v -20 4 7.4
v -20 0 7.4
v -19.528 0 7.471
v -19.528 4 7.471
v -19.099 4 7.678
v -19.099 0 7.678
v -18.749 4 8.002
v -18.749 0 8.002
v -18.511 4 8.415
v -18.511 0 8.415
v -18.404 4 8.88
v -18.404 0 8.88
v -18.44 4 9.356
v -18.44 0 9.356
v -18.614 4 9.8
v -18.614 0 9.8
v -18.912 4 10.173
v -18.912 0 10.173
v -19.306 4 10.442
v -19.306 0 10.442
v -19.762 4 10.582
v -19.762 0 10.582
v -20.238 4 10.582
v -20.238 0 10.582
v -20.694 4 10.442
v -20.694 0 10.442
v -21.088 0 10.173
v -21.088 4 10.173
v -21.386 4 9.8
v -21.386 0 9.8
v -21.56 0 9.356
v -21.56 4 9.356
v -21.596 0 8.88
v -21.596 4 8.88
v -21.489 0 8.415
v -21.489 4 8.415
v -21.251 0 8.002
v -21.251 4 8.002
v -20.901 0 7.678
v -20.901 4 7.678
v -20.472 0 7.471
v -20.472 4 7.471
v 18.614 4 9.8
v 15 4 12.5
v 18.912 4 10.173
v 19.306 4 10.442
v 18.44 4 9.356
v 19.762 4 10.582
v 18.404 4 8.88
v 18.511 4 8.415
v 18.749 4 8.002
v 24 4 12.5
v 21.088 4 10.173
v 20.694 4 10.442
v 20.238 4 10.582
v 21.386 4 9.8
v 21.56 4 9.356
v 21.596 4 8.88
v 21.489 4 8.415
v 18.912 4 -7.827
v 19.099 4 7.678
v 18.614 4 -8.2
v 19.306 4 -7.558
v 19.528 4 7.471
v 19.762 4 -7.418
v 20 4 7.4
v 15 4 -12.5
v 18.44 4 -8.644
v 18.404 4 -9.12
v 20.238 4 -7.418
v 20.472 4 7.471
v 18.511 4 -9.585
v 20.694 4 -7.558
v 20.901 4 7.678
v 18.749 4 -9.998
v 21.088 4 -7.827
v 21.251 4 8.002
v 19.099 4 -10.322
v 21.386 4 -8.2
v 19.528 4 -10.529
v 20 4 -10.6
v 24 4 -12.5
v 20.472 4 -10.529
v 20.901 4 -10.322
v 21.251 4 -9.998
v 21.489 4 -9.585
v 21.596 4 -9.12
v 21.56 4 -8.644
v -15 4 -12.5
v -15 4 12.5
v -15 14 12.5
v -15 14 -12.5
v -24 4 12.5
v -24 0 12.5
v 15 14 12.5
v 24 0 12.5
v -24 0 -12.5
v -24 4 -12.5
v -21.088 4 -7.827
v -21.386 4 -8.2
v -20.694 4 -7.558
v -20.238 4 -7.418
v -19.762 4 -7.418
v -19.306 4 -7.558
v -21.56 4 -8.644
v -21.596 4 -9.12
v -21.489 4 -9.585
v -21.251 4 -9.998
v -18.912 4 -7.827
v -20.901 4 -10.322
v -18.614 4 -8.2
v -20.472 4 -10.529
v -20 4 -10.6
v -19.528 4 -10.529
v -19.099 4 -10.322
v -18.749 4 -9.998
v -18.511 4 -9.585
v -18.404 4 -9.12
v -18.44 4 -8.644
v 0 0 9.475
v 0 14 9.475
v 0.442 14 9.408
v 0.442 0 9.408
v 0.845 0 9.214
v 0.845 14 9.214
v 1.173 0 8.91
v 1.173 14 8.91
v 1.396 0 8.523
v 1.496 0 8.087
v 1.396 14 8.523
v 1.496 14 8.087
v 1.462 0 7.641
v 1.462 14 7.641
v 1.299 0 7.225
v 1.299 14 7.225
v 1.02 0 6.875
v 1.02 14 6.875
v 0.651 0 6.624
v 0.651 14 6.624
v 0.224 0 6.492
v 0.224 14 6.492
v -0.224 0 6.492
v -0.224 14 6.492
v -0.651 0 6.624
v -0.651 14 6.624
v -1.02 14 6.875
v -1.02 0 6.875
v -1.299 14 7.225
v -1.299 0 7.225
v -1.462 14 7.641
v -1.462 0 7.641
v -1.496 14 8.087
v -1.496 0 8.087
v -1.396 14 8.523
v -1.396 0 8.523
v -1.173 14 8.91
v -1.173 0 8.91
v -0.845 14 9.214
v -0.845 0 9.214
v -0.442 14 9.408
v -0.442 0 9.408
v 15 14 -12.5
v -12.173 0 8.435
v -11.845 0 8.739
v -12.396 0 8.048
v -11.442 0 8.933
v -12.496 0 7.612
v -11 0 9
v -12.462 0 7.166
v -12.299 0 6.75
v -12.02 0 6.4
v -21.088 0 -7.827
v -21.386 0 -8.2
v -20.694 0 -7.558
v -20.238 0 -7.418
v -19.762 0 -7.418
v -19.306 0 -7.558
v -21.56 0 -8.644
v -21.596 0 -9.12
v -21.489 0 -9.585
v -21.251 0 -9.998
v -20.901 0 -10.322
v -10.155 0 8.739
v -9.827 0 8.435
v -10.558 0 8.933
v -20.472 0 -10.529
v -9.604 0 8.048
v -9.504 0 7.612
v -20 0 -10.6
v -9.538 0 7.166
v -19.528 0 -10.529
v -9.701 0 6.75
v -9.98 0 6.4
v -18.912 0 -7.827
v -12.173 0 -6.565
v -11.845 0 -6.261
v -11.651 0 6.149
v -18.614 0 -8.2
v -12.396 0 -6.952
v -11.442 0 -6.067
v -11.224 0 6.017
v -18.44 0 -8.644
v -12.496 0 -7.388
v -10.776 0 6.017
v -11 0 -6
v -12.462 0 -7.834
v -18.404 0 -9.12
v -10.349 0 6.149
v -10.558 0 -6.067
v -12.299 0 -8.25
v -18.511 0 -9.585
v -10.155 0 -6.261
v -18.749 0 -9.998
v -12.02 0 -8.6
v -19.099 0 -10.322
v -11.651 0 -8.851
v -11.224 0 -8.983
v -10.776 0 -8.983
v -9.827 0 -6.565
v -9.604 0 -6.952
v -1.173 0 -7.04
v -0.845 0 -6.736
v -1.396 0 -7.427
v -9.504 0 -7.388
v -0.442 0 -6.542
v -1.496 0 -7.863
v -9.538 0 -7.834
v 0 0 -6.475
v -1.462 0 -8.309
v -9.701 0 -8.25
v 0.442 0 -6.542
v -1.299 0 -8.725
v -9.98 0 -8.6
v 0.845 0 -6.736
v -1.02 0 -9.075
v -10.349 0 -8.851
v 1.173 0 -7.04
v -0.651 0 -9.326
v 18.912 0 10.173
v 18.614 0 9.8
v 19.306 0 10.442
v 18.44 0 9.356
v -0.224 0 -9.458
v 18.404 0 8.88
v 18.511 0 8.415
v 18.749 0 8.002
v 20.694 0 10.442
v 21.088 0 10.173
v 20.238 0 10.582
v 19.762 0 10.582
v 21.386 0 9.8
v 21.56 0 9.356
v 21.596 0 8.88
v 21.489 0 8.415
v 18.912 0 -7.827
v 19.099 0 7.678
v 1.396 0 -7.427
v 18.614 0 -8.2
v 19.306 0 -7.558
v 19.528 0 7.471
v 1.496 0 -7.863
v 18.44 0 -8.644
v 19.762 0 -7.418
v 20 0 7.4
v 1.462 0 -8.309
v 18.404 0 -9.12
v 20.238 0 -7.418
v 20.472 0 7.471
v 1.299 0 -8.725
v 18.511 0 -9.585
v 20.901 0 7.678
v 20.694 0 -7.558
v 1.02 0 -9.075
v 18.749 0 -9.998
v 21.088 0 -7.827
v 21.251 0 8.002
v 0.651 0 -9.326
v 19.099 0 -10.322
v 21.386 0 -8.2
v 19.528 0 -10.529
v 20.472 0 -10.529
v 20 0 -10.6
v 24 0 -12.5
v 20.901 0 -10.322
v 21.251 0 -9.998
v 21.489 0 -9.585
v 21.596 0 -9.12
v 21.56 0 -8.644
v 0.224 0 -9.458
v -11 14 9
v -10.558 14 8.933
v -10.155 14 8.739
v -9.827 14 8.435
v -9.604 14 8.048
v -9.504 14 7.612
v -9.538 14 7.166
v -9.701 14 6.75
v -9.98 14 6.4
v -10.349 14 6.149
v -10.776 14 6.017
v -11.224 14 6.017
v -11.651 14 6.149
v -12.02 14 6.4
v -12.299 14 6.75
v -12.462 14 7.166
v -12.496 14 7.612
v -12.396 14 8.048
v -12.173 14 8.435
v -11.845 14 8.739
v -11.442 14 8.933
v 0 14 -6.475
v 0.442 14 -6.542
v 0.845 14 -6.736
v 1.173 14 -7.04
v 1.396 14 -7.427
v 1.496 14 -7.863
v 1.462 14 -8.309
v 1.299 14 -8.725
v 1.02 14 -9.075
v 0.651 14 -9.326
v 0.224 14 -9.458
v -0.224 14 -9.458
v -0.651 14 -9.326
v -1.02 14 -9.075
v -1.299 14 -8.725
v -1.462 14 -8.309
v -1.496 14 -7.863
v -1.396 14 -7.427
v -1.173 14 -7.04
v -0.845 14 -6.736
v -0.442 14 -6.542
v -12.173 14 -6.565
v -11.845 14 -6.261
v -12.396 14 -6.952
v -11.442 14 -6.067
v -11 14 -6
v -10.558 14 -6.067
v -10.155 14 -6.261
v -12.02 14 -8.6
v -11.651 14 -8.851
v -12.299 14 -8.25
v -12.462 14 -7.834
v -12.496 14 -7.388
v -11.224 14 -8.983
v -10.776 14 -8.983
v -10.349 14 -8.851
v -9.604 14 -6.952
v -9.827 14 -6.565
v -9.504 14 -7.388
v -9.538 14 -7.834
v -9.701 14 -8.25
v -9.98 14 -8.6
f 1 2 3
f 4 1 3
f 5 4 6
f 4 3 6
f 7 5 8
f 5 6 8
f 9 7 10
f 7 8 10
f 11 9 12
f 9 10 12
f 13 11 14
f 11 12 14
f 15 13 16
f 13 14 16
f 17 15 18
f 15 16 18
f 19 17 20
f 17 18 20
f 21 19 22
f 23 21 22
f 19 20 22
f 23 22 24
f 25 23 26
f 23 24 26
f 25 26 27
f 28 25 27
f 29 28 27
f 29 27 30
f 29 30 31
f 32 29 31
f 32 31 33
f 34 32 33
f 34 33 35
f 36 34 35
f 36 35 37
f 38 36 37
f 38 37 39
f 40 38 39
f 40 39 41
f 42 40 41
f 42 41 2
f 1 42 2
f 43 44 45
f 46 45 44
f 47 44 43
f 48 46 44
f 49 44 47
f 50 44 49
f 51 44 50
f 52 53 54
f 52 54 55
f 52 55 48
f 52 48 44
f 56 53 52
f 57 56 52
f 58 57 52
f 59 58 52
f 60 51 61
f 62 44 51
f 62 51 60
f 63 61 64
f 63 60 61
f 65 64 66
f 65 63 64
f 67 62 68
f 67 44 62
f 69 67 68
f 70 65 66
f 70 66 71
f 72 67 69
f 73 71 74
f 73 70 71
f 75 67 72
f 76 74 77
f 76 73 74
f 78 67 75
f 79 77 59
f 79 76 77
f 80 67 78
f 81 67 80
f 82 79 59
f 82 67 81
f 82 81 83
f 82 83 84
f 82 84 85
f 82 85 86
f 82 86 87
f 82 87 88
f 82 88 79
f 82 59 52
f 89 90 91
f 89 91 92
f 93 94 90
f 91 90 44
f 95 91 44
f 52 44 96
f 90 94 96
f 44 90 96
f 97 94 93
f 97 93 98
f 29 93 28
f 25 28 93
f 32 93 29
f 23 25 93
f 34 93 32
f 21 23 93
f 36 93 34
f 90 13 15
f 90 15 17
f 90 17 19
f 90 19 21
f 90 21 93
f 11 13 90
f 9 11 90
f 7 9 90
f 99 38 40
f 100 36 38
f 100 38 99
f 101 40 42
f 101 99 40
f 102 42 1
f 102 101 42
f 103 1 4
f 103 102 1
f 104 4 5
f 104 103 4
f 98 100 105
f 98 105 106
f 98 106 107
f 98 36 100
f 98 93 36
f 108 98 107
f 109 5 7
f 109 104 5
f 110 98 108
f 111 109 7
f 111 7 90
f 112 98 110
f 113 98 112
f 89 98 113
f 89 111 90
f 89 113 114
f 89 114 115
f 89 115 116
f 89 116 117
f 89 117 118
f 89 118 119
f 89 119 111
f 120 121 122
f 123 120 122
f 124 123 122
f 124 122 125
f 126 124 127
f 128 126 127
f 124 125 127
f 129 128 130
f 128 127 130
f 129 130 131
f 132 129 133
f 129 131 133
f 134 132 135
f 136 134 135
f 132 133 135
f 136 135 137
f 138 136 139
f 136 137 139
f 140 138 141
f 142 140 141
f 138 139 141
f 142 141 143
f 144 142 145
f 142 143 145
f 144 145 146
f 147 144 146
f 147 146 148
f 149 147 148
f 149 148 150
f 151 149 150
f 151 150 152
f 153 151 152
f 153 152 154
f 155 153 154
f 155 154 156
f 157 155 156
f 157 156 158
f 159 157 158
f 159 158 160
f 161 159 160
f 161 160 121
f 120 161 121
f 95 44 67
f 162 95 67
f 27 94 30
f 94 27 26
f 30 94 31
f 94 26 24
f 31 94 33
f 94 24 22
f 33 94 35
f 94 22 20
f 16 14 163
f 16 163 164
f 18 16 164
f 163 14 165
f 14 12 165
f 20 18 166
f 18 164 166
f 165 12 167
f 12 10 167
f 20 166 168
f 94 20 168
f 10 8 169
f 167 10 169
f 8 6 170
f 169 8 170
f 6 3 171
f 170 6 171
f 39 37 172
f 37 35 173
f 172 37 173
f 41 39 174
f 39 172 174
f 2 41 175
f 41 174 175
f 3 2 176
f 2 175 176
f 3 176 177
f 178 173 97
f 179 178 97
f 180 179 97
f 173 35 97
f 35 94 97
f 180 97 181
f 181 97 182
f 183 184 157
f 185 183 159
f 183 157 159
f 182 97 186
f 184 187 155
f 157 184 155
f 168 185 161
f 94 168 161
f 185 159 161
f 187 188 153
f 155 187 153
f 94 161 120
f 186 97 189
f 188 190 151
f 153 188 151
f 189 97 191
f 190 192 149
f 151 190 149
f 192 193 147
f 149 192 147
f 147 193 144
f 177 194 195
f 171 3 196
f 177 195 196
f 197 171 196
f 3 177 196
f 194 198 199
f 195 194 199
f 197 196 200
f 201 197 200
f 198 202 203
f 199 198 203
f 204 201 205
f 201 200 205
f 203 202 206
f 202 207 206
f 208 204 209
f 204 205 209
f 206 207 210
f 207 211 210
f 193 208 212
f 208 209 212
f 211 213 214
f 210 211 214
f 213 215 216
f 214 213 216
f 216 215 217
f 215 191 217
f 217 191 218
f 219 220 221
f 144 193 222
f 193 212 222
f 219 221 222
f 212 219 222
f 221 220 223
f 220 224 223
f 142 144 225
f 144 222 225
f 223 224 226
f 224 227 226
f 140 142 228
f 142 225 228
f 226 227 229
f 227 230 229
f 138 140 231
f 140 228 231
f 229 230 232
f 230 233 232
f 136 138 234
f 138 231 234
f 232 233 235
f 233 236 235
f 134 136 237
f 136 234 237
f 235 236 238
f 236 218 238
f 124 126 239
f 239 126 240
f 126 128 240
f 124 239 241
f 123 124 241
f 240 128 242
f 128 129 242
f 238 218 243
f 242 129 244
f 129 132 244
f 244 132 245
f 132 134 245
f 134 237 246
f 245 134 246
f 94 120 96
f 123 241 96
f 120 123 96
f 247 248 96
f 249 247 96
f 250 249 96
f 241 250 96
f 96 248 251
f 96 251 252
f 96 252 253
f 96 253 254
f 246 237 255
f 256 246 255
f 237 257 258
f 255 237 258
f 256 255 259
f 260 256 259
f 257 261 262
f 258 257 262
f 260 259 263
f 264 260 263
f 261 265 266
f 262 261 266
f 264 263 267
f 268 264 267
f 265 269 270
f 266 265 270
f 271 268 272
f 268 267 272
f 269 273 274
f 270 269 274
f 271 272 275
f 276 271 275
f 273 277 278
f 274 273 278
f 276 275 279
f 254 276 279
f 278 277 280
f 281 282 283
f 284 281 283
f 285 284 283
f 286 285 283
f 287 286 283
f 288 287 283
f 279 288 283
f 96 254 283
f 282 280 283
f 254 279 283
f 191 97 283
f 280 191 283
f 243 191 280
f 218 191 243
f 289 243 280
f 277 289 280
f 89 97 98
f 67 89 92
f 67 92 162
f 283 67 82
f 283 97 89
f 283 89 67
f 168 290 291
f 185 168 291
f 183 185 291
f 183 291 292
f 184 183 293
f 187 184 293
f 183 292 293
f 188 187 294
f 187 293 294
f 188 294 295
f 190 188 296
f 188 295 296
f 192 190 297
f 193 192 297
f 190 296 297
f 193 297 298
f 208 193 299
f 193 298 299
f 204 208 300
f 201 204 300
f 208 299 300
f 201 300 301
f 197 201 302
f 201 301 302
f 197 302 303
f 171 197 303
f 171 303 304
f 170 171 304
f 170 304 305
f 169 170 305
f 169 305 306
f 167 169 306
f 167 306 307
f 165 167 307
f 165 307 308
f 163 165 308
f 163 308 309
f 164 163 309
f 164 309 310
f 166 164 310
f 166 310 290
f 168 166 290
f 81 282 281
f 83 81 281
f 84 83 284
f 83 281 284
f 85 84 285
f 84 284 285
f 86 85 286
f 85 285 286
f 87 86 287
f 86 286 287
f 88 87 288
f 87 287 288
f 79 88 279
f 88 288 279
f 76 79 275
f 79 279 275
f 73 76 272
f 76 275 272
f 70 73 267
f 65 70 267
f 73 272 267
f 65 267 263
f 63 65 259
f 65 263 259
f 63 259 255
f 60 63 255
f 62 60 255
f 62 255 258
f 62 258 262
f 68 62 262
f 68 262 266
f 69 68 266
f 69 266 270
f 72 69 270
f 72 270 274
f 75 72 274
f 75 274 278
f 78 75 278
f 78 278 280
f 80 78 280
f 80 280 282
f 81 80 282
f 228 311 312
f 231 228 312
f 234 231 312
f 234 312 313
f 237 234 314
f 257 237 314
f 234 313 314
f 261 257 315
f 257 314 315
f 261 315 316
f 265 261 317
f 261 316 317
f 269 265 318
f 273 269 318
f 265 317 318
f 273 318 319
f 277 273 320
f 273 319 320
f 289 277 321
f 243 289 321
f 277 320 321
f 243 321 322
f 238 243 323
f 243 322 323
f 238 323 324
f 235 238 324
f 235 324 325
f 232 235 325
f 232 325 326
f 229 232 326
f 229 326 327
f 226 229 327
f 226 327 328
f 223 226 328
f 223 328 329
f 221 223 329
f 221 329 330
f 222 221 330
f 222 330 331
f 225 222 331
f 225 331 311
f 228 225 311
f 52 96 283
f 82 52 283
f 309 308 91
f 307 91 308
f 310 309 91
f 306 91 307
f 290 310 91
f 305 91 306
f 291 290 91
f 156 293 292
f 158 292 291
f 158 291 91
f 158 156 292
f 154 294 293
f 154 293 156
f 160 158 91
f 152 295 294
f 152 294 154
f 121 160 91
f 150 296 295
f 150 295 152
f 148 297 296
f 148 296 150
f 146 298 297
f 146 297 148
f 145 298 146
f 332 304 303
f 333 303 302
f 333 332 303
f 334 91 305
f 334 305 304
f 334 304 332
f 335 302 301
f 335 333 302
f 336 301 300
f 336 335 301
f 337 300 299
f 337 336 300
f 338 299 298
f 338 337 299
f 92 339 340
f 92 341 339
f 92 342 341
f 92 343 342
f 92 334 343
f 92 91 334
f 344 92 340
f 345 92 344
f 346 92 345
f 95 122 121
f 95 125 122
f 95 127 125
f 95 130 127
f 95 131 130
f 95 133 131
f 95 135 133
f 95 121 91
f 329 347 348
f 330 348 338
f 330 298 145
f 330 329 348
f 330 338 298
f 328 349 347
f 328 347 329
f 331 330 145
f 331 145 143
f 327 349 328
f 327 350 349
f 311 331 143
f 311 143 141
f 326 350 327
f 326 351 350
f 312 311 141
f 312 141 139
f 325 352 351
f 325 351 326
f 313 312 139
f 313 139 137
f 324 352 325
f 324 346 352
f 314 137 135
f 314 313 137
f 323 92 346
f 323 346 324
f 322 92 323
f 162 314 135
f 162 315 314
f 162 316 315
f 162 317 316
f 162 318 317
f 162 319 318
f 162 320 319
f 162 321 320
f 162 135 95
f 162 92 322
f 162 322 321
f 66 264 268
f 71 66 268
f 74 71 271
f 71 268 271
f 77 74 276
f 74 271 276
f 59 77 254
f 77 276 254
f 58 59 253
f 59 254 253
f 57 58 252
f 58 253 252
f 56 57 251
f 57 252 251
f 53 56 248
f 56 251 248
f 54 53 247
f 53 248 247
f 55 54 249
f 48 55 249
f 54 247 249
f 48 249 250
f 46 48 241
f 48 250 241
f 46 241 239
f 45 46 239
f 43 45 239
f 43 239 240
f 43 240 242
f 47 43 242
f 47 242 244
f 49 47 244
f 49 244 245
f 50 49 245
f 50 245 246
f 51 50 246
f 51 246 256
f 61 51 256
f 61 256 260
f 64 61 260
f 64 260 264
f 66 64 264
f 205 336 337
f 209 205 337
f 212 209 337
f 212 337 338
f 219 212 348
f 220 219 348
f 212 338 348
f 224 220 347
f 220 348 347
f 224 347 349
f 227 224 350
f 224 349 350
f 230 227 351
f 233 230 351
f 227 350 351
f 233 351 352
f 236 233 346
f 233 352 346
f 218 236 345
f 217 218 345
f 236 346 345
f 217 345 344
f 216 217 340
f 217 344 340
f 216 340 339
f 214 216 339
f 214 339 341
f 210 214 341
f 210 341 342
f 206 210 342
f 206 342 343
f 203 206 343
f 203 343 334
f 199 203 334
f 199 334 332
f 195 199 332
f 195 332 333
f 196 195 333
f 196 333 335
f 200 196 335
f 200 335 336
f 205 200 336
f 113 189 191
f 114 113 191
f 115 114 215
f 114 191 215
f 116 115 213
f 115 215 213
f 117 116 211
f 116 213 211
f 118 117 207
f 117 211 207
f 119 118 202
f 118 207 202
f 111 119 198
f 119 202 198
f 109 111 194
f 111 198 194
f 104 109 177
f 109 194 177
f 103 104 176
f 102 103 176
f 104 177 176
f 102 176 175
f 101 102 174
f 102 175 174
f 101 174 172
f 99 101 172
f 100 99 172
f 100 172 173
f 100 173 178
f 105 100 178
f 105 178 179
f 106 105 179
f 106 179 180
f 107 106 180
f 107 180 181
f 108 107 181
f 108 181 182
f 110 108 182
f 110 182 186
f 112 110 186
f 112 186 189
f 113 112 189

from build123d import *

# Parameters (mm, degrees)
SKETCH1_W           = 48
SKETCH1_H           = 25
BOSS_EXTRUDE1_DEPTH = 4
SKETCH2_W           = 30
SKETCH2_H           = 25
BOSS_EXTRUDE2_DEPTH = 10
SKETCH3_R           = 1.5
CUT_EXTRUDE1_DEPTH  = 15
SKETCH4_R           = 1.6
CUT_EXTRUDE2_DEPTH  = 15


with BuildPart() as part:
    # Sketch1 → Boss-Extrude1 (new body)
    with BuildSketch(Plane(origin=(0, 0, 0), x_dir=(1, 0, 0), z_dir=(0, 1, 0))):
        Rectangle(SKETCH1_W, SKETCH1_H)
    extrude(amount=BOSS_EXTRUDE1_DEPTH)

    # Sketch2 → Boss-Extrude2 (add)
    with BuildSketch(Plane(origin=(0, 4, 0), x_dir=(1, 0, 0), z_dir=(0, 1, 0))):
        Rectangle(SKETCH2_W, SKETCH2_H)
    extrude(amount=BOSS_EXTRUDE2_DEPTH)

    # Sketch3 → Cut-Extrude1 (cut, through all)
    with BuildSketch(Plane(origin=(0, 14, 0), x_dir=(1, 0, 0), z_dir=(0, 1, 0))):
        with Locations(Location((0, 7.975, 0), (0, 0, 270))):  # turned: the seam where the file's is
            Circle(SKETCH3_R)
        with Locations(Location((0, -7.975, 0), (0, 0, 270))):  # turned: the seam where the file's is
            Circle(SKETCH3_R)
        with Locations(Location((-11, 7.5, 0), (0, 0, 270))):  # turned: the seam where the file's is
            Circle(SKETCH3_R)
        with Locations(Location((-11, -7.5, 0), (0, 0, 270))):  # turned: the seam where the file's is
            Circle(SKETCH3_R)
    extrude(amount=-CUT_EXTRUDE1_DEPTH, mode=Mode.SUBTRACT)

    # Sketch4 → Cut-Extrude2 (cut, through all)
    with BuildSketch(Plane.XZ):
        with Locations(Location((-20, 9, 0), (0, 0, 270))):  # turned: the seam where the file's is
            Circle(SKETCH4_R)
        with Locations(Location((20, 9, 0), (0, 0, 270))):  # turned: the seam where the file's is
            Circle(SKETCH4_R)
        with Locations(Location((20, -9, 0), (0, 0, 270))):  # turned: the seam where the file's is
            Circle(SKETCH4_R)
        with Locations(Location((-20, -9, 0), (0, 0, 270))):  # turned: the seam where the file's is
            Circle(SKETCH4_R)
    extrude(amount=-CUT_EXTRUDE2_DEPTH, mode=Mode.SUBTRACT)


solid = part.part
